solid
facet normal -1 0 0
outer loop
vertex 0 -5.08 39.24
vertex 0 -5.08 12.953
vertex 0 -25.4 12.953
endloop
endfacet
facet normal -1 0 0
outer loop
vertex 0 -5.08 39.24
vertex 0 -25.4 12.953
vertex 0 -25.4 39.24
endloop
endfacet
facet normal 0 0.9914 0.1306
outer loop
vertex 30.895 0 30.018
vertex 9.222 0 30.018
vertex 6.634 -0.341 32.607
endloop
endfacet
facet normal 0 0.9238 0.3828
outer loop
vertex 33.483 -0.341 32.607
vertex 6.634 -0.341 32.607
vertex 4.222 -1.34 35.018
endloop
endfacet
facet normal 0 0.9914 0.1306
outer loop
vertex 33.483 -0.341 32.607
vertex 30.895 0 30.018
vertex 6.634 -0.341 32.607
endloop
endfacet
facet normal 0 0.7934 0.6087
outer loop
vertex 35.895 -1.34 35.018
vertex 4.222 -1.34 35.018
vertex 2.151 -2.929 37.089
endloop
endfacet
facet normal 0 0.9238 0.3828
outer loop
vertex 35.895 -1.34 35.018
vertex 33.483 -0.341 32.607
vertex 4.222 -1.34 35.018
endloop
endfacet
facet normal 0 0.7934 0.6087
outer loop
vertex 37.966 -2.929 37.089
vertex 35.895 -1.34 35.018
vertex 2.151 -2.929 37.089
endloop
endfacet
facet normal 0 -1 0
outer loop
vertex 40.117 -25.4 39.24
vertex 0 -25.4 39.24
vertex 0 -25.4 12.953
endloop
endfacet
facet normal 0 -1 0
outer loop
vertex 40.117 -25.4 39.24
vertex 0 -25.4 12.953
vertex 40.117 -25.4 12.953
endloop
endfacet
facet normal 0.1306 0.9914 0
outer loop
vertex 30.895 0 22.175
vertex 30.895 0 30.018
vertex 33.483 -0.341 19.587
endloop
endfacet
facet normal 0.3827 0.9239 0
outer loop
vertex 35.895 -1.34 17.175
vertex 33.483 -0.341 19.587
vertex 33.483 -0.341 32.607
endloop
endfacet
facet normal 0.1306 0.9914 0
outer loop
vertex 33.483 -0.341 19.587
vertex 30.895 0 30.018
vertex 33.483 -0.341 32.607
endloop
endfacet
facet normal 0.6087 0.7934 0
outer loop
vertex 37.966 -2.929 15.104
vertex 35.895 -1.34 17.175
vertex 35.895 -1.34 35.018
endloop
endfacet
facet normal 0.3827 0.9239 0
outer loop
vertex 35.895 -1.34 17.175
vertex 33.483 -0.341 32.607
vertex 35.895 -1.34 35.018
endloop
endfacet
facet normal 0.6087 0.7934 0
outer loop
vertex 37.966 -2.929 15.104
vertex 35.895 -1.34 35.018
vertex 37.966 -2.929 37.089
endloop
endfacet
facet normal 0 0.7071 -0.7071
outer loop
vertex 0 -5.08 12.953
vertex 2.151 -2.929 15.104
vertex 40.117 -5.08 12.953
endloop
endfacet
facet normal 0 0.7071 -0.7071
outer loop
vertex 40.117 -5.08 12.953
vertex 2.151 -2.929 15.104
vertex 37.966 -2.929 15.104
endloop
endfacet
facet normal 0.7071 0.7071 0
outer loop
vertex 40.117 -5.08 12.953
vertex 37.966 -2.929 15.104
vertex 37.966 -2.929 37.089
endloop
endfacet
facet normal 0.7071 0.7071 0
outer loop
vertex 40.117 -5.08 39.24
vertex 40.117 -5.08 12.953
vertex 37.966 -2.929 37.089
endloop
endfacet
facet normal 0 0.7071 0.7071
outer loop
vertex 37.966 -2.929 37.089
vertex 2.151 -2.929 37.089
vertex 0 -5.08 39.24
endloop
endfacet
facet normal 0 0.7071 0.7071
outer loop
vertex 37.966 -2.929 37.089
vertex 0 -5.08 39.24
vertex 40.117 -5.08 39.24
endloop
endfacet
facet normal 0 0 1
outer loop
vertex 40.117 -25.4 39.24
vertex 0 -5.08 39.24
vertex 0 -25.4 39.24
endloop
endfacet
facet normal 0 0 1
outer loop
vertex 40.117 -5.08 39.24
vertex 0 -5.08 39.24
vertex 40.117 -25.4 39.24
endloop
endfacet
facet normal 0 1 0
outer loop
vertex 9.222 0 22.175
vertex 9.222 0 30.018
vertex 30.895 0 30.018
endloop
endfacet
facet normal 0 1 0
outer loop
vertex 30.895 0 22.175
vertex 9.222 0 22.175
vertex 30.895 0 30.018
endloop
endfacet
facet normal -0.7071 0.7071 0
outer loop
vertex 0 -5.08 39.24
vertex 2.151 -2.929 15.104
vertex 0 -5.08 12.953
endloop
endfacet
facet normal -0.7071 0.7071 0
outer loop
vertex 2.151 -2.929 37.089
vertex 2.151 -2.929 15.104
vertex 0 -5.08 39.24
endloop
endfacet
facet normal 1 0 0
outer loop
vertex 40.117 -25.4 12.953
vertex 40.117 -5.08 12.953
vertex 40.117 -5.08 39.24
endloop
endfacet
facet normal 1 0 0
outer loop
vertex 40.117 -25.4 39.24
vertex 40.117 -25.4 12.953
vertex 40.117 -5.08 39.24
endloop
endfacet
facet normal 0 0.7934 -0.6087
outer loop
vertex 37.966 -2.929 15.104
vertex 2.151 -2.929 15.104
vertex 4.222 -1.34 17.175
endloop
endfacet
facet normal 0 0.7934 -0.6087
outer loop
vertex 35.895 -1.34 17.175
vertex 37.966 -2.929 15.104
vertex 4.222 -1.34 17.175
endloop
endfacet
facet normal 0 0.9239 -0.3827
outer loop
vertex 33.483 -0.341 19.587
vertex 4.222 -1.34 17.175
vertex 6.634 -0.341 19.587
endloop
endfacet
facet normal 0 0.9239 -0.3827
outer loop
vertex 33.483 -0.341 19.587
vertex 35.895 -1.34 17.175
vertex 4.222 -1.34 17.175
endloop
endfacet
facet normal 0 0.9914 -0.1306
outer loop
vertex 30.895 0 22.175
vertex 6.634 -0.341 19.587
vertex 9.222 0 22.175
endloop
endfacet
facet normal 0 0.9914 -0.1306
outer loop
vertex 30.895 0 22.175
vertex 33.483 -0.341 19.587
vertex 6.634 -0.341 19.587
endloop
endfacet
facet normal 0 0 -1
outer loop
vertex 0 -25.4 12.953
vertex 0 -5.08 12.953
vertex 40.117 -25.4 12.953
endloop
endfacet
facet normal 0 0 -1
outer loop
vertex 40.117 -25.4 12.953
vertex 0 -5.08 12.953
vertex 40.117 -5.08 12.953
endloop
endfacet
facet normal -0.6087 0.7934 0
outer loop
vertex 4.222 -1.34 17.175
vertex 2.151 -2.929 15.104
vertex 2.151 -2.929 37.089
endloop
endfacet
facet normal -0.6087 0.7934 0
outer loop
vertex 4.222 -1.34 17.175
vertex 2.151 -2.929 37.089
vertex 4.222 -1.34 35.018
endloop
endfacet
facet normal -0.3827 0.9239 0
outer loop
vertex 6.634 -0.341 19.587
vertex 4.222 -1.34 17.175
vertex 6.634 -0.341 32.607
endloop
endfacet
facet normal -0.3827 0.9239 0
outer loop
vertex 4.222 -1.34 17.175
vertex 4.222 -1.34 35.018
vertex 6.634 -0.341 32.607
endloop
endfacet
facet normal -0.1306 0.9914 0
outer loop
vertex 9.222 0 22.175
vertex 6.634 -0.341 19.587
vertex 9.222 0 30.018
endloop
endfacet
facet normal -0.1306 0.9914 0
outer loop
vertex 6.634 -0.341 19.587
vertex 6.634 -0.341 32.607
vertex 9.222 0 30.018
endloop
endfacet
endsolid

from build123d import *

# Parameters (mm, degrees)
F0_W     = 40.1168912649
F0_H     = 26.2875333428
F1_DEPTH = 25.4
F2_SIZE  = 5.08
F3_R     = 10


with BuildPart() as f1:
    # F0 (on Front) → F1 (new body)
    with BuildSketch(Plane.XZ):
        with Locations((20.0584456325, 26.0967053473)):
            Rectangle(F0_W, F0_H)
    extrude(amount=F1_DEPTH)

    # F2
    f2_edges = [f1.edges().sort_by_distance(p)[0] for p in [
        (40.116891, 0, 26.096705),
        (20.058446, 0, 39.240472),
        (0, 0, 26.096705),
        (20.058446, 0, 12.952939),
    ]]
    chamfer(f2_edges, length=F2_SIZE)

    # F3
    f3_edges = [f1.edges().sort_by_distance(p)[0] for p in [
        (35.036891, 0, 26.096705),
        (20.058446, 0, 34.160472),
        (5.08, 0, 26.096705),
        (20.058446, 0, 18.032939),
    ]]
    fillet(f3_edges, radius=F3_R)


solid = f1.part
